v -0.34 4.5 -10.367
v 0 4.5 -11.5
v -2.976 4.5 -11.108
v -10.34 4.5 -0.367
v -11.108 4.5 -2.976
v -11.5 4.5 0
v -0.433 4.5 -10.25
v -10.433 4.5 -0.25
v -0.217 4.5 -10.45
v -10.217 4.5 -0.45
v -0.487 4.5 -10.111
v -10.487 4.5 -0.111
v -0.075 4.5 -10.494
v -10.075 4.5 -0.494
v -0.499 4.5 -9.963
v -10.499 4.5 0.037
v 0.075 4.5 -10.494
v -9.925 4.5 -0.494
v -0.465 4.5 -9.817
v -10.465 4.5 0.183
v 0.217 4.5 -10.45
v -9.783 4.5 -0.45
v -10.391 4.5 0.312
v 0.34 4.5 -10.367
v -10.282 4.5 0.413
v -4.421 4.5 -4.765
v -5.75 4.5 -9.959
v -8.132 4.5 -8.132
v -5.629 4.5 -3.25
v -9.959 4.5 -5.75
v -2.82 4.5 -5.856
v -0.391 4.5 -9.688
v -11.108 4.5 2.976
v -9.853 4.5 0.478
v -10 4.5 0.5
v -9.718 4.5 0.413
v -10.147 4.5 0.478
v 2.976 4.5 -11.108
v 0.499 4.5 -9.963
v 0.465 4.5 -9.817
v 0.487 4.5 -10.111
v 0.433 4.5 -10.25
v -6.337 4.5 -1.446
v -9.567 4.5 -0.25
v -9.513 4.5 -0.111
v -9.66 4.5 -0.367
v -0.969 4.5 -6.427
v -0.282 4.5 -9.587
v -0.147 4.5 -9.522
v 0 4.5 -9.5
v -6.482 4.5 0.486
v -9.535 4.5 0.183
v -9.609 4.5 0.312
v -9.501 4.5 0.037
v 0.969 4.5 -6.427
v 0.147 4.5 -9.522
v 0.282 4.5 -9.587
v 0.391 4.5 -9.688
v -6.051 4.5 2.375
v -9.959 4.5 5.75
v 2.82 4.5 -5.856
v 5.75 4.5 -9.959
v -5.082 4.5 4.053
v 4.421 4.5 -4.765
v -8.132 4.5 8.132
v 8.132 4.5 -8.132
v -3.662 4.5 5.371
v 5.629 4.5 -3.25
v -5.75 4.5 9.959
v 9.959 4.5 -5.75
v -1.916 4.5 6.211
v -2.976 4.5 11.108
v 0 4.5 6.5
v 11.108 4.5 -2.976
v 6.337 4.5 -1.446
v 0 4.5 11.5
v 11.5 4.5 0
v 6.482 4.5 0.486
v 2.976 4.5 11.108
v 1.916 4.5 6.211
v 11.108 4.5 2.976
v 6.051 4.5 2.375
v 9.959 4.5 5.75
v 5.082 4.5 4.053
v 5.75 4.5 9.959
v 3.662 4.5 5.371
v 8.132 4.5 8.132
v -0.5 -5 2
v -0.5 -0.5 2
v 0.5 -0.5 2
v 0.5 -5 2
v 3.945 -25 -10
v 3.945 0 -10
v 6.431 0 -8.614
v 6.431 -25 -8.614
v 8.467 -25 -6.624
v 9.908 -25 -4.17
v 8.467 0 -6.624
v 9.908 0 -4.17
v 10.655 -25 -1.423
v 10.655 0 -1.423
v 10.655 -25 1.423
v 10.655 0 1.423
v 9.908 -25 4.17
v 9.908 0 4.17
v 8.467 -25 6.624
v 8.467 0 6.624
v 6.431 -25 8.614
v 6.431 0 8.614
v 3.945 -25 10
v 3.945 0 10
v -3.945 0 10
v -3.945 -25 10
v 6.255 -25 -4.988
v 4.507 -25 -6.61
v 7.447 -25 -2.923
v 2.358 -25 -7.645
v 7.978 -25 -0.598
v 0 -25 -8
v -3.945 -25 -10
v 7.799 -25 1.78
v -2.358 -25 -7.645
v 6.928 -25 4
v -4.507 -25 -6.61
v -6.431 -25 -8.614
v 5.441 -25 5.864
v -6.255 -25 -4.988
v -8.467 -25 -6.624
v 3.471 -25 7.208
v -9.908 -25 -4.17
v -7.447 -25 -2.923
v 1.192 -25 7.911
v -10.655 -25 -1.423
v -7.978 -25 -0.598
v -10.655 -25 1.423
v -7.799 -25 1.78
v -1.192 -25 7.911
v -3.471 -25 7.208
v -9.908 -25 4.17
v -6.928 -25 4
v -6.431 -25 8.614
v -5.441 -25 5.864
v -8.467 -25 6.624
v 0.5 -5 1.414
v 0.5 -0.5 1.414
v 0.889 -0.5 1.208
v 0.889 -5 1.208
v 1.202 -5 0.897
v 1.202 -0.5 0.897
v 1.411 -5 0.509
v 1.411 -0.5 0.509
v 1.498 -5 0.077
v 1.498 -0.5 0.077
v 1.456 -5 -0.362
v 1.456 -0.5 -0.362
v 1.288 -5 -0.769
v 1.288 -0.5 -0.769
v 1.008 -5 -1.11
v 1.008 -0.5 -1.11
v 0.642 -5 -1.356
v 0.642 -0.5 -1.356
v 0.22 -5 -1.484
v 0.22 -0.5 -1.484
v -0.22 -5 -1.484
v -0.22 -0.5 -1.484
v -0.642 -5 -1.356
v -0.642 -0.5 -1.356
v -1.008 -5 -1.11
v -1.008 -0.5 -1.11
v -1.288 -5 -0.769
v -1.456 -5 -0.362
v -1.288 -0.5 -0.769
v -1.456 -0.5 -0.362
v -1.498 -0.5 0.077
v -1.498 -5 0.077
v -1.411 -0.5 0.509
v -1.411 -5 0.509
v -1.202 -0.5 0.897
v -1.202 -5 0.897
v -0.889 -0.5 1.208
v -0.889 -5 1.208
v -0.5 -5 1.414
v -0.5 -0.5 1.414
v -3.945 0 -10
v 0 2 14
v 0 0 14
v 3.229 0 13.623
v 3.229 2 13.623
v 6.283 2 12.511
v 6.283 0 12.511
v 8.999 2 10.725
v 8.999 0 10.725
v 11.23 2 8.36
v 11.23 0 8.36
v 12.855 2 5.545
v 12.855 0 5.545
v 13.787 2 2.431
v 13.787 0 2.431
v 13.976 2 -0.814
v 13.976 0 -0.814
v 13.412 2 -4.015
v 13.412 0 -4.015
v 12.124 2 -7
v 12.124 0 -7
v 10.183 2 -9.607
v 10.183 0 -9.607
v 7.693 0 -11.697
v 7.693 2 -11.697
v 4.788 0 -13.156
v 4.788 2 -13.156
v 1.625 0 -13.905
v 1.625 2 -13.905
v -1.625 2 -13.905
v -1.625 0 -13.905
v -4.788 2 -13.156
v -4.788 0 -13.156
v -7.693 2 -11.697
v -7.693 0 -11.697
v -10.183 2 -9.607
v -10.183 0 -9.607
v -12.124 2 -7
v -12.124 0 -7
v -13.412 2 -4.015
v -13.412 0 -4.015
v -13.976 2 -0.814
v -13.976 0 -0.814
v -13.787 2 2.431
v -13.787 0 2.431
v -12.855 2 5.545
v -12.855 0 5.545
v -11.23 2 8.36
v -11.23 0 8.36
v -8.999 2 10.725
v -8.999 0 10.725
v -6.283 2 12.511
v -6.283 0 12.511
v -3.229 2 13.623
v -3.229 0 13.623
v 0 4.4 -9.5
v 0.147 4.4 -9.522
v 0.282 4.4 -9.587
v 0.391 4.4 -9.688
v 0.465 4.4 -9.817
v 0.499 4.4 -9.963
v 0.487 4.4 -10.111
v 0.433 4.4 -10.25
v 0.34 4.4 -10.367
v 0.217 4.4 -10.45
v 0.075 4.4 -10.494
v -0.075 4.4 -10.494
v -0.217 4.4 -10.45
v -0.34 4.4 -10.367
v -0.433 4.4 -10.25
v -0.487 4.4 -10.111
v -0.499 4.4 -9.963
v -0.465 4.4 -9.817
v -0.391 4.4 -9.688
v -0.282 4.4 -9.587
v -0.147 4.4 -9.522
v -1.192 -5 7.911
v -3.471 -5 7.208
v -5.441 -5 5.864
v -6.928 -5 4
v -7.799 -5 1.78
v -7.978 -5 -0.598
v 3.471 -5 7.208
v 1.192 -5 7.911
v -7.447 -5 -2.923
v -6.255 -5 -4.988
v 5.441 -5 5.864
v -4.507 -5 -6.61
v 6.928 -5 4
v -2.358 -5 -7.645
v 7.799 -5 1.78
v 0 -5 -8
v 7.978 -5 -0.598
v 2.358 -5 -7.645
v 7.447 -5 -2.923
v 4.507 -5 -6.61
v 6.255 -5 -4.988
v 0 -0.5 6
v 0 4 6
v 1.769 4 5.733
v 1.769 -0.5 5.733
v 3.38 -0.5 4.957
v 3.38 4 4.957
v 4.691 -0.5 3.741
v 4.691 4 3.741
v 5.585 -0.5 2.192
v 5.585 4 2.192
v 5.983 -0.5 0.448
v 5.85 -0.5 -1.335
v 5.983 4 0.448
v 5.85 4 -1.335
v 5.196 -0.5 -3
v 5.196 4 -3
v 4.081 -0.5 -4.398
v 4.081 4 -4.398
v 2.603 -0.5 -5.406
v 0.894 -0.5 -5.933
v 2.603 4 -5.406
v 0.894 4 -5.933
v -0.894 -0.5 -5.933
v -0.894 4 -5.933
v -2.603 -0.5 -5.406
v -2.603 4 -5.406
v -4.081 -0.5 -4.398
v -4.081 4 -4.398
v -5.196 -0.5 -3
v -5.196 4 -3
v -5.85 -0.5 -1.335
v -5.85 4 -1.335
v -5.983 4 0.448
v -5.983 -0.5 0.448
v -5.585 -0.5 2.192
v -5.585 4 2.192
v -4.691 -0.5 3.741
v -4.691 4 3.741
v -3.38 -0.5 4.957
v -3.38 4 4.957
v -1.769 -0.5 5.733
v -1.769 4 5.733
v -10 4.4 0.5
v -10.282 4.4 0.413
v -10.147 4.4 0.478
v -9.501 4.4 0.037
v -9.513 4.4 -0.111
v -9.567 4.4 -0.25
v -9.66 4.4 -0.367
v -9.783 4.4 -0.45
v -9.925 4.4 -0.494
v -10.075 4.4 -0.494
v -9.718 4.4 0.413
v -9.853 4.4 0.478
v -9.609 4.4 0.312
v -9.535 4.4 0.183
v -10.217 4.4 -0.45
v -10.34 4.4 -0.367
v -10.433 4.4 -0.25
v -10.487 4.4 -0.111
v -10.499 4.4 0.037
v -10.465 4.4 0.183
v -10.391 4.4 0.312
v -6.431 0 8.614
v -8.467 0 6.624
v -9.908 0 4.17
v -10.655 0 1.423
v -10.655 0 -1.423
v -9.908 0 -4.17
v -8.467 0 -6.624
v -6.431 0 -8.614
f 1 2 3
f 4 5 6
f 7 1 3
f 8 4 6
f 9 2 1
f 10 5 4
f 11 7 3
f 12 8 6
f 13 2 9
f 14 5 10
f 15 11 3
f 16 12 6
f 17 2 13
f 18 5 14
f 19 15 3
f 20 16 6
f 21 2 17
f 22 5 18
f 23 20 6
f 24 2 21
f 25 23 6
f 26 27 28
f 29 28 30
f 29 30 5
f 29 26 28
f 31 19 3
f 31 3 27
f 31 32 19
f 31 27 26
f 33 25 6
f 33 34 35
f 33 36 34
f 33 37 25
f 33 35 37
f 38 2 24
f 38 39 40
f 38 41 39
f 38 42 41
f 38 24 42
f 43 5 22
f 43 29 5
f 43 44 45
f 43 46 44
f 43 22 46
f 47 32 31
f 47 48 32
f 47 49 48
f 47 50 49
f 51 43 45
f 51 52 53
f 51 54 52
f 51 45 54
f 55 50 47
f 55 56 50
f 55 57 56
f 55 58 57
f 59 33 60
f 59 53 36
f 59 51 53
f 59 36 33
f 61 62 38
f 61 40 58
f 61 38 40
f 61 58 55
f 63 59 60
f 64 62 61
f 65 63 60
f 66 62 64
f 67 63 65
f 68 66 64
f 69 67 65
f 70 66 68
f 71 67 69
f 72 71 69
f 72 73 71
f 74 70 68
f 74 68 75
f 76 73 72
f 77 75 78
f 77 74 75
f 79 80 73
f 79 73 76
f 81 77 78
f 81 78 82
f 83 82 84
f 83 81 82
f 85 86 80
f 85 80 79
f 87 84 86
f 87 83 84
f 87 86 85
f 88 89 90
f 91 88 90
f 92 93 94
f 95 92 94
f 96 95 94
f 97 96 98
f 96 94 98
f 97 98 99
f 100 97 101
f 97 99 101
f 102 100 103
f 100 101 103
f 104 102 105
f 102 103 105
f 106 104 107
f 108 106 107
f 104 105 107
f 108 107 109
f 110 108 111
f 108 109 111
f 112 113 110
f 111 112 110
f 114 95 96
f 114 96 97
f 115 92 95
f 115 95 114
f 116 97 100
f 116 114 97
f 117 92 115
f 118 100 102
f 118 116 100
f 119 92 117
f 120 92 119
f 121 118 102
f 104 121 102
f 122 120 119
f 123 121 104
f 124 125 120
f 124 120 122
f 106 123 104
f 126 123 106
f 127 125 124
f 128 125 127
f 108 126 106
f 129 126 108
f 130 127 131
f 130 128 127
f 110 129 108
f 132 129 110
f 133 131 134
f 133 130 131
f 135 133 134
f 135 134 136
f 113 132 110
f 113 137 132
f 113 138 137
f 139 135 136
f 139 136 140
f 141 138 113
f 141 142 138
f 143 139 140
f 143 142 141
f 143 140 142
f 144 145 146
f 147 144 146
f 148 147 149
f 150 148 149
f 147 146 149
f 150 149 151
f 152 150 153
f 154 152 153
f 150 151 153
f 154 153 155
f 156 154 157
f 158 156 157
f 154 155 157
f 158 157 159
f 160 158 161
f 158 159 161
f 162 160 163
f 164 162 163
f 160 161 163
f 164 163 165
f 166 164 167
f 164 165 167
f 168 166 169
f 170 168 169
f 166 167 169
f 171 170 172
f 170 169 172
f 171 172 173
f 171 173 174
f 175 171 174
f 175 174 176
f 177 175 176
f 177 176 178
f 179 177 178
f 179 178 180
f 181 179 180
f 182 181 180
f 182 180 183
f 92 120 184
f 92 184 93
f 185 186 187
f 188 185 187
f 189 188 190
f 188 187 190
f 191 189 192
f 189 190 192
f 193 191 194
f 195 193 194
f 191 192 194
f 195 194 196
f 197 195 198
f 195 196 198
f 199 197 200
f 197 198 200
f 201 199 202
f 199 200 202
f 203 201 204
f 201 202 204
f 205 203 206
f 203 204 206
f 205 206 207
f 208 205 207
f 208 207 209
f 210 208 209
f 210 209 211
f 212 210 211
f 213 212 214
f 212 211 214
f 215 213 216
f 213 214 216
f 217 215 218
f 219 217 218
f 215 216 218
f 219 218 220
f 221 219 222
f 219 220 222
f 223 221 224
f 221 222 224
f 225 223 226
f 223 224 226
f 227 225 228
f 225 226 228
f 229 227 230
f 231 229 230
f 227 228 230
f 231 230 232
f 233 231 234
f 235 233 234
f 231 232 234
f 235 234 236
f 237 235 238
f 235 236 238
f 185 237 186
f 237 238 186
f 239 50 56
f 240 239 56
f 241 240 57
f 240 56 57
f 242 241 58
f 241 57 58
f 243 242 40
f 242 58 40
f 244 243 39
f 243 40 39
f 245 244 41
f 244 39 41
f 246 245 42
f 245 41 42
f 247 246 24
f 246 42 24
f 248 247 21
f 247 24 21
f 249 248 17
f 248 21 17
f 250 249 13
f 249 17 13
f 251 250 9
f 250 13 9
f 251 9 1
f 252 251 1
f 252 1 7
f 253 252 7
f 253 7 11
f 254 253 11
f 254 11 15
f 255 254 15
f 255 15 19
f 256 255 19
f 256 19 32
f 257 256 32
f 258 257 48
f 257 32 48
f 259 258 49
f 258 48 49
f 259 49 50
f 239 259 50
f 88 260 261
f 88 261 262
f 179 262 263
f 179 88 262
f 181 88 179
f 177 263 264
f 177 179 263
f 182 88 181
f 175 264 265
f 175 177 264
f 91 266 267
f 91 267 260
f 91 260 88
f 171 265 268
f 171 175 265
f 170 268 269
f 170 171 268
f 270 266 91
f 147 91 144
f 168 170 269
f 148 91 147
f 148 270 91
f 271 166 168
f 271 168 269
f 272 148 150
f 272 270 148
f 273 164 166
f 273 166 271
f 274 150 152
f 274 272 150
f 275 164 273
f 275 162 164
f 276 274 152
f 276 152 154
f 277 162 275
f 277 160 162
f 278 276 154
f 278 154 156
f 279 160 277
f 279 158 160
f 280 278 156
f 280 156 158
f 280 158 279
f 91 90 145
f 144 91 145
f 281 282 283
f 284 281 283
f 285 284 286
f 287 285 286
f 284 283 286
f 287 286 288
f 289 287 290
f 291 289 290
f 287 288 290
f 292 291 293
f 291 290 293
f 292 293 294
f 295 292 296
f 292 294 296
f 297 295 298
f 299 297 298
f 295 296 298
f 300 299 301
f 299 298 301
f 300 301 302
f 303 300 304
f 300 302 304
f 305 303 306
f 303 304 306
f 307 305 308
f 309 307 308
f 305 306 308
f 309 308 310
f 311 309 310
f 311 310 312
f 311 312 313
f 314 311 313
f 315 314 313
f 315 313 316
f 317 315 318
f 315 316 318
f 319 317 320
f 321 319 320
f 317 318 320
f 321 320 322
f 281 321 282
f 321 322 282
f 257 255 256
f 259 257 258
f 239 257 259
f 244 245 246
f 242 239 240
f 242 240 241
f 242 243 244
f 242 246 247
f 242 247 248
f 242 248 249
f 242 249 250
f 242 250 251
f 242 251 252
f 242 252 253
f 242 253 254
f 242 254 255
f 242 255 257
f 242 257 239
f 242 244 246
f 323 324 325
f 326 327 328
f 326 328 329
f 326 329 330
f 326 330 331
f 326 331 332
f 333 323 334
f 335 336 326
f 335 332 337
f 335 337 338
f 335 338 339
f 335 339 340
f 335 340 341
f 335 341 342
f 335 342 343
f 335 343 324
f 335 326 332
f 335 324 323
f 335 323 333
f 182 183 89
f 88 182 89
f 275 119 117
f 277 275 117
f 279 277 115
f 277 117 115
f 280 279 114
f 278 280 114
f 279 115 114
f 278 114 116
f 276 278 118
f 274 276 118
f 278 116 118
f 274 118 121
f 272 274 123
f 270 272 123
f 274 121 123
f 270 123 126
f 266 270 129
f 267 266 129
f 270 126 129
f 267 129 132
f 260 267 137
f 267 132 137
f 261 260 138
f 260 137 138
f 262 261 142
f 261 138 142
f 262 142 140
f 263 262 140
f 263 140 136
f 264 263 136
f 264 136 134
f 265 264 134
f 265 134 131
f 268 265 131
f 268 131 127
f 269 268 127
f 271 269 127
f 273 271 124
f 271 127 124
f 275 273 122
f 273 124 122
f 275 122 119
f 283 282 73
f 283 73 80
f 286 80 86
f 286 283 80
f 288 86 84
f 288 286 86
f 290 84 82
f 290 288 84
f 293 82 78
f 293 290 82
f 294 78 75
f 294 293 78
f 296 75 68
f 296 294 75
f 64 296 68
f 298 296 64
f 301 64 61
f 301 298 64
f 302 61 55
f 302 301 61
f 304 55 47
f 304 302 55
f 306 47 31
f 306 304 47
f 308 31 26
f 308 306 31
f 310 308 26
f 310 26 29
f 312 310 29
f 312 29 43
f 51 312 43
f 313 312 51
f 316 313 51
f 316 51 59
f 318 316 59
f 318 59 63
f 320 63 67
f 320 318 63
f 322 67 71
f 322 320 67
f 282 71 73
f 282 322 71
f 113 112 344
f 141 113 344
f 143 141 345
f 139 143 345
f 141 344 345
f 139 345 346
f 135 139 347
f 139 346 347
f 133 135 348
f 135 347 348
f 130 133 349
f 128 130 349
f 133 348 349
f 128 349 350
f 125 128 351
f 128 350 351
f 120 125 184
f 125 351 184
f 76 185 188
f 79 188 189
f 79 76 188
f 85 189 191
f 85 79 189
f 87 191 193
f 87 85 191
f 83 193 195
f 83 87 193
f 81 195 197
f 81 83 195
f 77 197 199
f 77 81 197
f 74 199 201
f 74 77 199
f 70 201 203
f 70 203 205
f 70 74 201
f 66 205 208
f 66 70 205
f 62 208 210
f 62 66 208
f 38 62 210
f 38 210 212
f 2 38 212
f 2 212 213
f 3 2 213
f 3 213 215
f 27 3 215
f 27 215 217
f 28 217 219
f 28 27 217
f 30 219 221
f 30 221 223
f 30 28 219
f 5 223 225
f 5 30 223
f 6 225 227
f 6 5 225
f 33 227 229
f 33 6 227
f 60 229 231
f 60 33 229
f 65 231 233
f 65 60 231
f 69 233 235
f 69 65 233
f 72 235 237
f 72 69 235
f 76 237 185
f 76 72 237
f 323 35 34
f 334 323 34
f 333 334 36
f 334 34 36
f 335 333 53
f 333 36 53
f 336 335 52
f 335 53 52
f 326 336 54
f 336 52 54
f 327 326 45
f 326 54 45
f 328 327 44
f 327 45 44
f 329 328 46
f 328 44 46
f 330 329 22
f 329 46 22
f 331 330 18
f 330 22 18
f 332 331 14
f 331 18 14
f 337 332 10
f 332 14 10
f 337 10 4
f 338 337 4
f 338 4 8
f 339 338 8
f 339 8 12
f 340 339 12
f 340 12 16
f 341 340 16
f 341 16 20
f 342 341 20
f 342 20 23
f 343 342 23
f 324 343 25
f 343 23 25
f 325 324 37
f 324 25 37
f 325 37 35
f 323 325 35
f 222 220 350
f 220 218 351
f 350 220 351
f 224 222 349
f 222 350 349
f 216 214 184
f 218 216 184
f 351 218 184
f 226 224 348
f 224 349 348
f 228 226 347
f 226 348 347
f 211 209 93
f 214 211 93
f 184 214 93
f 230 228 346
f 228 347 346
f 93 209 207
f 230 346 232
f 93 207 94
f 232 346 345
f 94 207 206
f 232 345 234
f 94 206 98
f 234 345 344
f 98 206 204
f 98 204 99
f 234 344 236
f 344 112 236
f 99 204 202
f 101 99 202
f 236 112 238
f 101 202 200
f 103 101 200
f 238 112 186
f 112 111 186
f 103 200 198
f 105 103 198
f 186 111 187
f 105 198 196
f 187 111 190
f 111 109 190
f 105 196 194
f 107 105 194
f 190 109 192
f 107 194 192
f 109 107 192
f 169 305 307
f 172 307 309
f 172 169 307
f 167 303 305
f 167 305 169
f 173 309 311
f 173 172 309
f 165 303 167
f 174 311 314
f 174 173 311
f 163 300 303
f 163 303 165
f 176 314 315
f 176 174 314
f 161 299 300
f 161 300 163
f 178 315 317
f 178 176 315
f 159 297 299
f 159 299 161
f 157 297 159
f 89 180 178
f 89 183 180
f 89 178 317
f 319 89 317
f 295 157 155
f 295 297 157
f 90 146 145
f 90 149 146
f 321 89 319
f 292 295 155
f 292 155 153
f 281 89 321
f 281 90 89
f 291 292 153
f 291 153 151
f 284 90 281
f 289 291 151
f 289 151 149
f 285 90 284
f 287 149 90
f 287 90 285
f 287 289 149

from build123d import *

# Parameters (mm, degrees)
SKETCH_1_R            = 14
EXTRUDE_1_DEPTH       = 4.5
SKETCH_8_R            = 0.5
CUT_EXTRUDE_594_DEPTH = 0.1
CHAMFER_1_SIZE        = 2.5
SKETCH_2_R            = 10.75
EXTRUDE_2_DEPTH       = 25
CUT_EXTRUDE_START     = -25
CUT_EXTRUDE_1_DEPTH   = 25
SKETCH_4_R            = 6
CUT_EXTRUDE_2_DEPTH   = 5
CHAMFER_2_SIZE        = 0.5
SKETCH_6_R            = 8
CUT_EXTRUDE_3_DEPTH   = 20
CUT_EXTRUDE_4_DEPTH   = 32.5


with BuildPart() as part:
    # 草图1 → 凸台-拉伸1 (new body)
    with BuildSketch(Plane(origin=(0, 0, 0), x_dir=(1, 0, 0), z_dir=(0, 1, 0))):
        with Locations(Location((0, 0, 0), (0, 0, 270))):
            Circle(SKETCH_1_R)
    extrude(amount=EXTRUDE_1_DEPTH)

    # 草图8 → Cut-Extrude 594 (cut)
    with BuildSketch(Plane(origin=(0, 4.5, 0), x_dir=(1, 0, 0), z_dir=(0, 1, 0))):
        with Locations(Location((-10, 0, 0), (0, 0, 270))):
            Circle(SKETCH_8_R)
        with Locations(Location((0, 10, 0), (0, 0, 270))):
            Circle(SKETCH_8_R)
    extrude(amount=-CUT_EXTRUDE_594_DEPTH, mode=Mode.SUBTRACT)

    # 倒角1
    chamfer_1_edges = [part.edges().sort_by_distance(p)[0] for p in [
        (0, 4.5, -14),
    ]]
    chamfer(chamfer_1_edges, length=CHAMFER_1_SIZE)

    # 草图2 → 凸台-拉伸2 (add)
    with BuildSketch(Plane.XZ):
        with Locations(Location((0, 0, 0), (0, 0, 90))):
            Circle(SKETCH_2_R)
    extrude(amount=EXTRUDE_2_DEPTH)

    # 草图3 → 切除-拉伸1 (cut)
    with BuildSketch(Plane.XZ.offset(25).offset(CUT_EXTRUDE_START)):
        with BuildLine():
            Line((-3.94493346, -10), (3.94493346, -10))
            ThreePointArc((3.94493346, -10), (0, -10.75), (-3.94493346, -10))
        make_face()
        with BuildLine():
            Line((-3.94493346, 10), (3.94493346, 10))
            ThreePointArc((3.94493346, 10), (0, 10.75), (-3.94493346, 10))
        make_face()
    extrude(amount=CUT_EXTRUDE_1_DEPTH, mode=Mode.SUBTRACT)

    # 草图4 → 切除-拉伸2 (cut)
    with BuildSketch(Plane(origin=(0, 4.5, 0), x_dir=(1, 0, 0), z_dir=(0, 1, 0))):
        with Locations(Location((0, 0, 0), (0, 0, 270))):
            Circle(SKETCH_4_R)
    extrude(amount=-CUT_EXTRUDE_2_DEPTH, mode=Mode.SUBTRACT)

    # 倒角2
    chamfer_2_edges = [part.edges().sort_by_distance(p)[0] for p in [
        (0, 4.5, -6),
    ]]
    chamfer(chamfer_2_edges, length=CHAMFER_2_SIZE)

    # 草图6 → 切除-拉伸3 (cut)
    with BuildSketch(Plane.XZ.offset(25)):
        with Locations(Location((0, 0, 0), (0, 0, 270))):
            Circle(SKETCH_6_R)
    extrude(amount=-CUT_EXTRUDE_3_DEPTH, mode=Mode.SUBTRACT)

    # 草图7 → 切除-拉伸4 (cut, through all)
    with BuildSketch(Plane(origin=(0, -0.5, 0), x_dir=(1, 0, 0), z_dir=(0, 1, 0))):
        with BuildLine():
            Line((0.5, -2), (0.5, -1.414213562))
            ThreePointArc((0.5, -1.414213562), (0, 1.5), (-0.5, -1.414213562))
            Line((-0.5, -1.414213562), (-0.5, -2))
            Line((-0.5, -2), (0.5, -2))
        make_face()
    extrude(amount=-CUT_EXTRUDE_4_DEPTH, mode=Mode.SUBTRACT)


solid = part.part
